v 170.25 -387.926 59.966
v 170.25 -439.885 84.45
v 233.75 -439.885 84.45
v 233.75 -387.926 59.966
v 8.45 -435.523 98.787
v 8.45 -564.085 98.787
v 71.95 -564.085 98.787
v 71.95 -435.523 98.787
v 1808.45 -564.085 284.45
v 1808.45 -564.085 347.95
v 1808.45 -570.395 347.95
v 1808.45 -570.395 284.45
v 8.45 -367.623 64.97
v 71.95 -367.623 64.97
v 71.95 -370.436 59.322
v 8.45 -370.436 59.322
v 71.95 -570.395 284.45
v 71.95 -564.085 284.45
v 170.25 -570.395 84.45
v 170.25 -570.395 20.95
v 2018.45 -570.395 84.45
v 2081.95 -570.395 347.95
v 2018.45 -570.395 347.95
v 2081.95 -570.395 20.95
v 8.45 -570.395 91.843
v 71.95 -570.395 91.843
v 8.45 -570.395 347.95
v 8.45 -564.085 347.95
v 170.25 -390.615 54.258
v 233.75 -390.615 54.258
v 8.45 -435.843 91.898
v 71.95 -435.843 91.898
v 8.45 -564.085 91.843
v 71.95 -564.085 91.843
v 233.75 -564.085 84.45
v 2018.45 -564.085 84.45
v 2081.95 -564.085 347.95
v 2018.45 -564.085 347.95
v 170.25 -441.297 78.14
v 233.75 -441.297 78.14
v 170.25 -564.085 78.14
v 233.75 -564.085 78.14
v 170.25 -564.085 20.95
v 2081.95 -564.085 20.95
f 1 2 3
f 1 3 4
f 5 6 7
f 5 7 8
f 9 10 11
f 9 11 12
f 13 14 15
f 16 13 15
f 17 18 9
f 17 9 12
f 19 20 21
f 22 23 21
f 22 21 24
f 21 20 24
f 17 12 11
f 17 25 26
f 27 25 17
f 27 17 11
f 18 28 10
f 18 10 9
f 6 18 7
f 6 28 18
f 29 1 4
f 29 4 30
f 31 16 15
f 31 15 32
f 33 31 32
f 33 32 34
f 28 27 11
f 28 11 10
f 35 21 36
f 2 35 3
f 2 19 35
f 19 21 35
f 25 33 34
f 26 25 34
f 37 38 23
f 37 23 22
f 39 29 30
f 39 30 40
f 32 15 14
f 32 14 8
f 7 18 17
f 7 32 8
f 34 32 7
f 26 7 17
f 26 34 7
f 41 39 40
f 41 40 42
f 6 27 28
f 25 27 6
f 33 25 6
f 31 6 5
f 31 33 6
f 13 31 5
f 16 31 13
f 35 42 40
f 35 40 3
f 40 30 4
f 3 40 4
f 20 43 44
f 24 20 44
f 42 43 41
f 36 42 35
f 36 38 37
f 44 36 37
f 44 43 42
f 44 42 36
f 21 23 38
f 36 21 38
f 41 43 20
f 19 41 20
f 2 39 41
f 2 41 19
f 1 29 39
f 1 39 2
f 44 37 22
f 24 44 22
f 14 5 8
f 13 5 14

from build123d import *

# Parameters (mm, degrees)
CROQUIS2_W              = 63.5
CROQUIS2_H              = 6.31
CROQUIS3_W              = 63.5
CROQUIS3_H              = 6.31
CROQUIS4_W              = 60
CROQUIS4_H              = 53.155
SALIENTE_EXTRUIR1_DEPTH = 6.31
CROQUIS5_W              = 60
CROQUIS5_H              = 6.31
CORTAR_EXTRUIR1_DEPTH   = 6.31
CORTAR_EXTRUIR2_DEPTH   = 502
CROQUIS8_W              = 63.5
CROQUIS8_H              = 564.085
CORTAR_EXTRUIR3_DEPTH   = 502
CROQUIS9_W              = 327
CROQUIS9_H              = 1084.052933
CORTAR_EXTRUIR4_DEPTH   = 502
CROQUIS10_W             = 63.5
CROQUIS10_H             = 6.31
CORTAR_EXTRUIR5_DEPTH   = 95
CORTAR_EXTRUIR6_DEPTH   = 95
CROQUIS13_W             = 120
CROQUIS13_H             = 256.105
CORTAR_EXTRUIR7_DEPTH   = 95
CROQUIS16_W             = 125
CROQUIS16_H             = 63.5
SALIENTE_EXTRUIR4_DEPTH = 6.31
CROQUIS17_W             = 63.5
CROQUIS17_H             = 6.31
SALIENTE_EXTRUIR5_DEPTH = 63.5
CROQUIS19_W             = 63.5
CROQUIS19_H             = 25.642933
CORTAR_EXTRUIR8_DEPTH   = 63.5
SALIENTE_EXTRUIR6_DEPTH = 63.5
CROQUIS21_W             = 10
CROQUIS21_H             = 63.5
CORTAR_EXTRUIR9_DEPTH   = 53


with BuildPart() as part:
    # Barrer1: sweep along a curve in space
    with BuildLine() as barrer1_path:
        Line((0, 0, 0), (0, -567.24, 0))
        Line((0, -567.24, 0), (0, -567.24, 316.2))
        Line((0, -567.24, 316.2), (1786.7, -567.24, 316.2))
        Line((1786.7, -567.24, 316.2), (1786.7, -567.24, 578))
        Line((1786.7, -567.24, 578), (1786.7, -435.47278313, 578))
        Line((1786.7, -435.47278313, 578), (1786.7, -435.47278313, 1432.002933))
    # Croquis2 → Barrer1 (sweep)
    with BuildSketch(Plane(origin=(0, 0, 0), x_dir=(1, 0, 0), z_dir=(0, 1, 0))):
        Rectangle(CROQUIS2_W, CROQUIS2_H)
        with Locations((263.5, 0)):
            Rectangle(CROQUIS2_W, CROQUIS2_H)
    sweep(path=barrer1_path.line, transition=Transition.RIGHT)

    # Barrer4: sweep along a curve in space
    with BuildLine() as barrer4_path:
        Line((-0.201028049, -3.155, -3.155), (-0.201028049, -3.155, -207.155))
        Line((-0.201028049, -3.155, -207.155), (-0.201028049, -53.155, -207.155))
    # Croquis3 → Barrer4 (sweep)
    with BuildSketch(Plane(origin=(0, 0, -3.155), x_dir=(-1, 0, 0), z_dir=(0, 0, -1))):
        with Locations((-263.5, -3.155)):
            Rectangle(CROQUIS3_W, CROQUIS3_H)
        with Locations((0, -3.155)):
            Rectangle(CROQUIS3_W, CROQUIS3_H)
    sweep(path=barrer4_path.line, transition=Transition.RIGHT)

    # Croquis4 → Saliente-Extruir1 (add)
    with BuildSketch(Plane(origin=(0, 0, -210.31), x_dir=(-1, 0, 0), z_dir=(0, 0, -1))):
        with Locations((-201.75, -26.5775)):
            Rectangle(CROQUIS4_W, CROQUIS4_H)
    extrude(amount=-SALIENTE_EXTRUIR1_DEPTH)

    # Croquis5 → Cortar-Extruir1 (cut)
    with BuildSketch(Plane.XY.offset(-204)):
        with Locations((201.75, -3.155)):
            Rectangle(CROQUIS5_W, CROQUIS5_H)
    extrude(amount=-CORTAR_EXTRUIR1_DEPTH, mode=Mode.SUBTRACT)

    # Croquis7 → Cortar-Extruir2 (cut)
    with BuildSketch(Plane.XY.offset(3.155)):
        Polygon((295.25, -564.085), (231.75, -564.085), (231.75, -68.875540851), (170.611072112, -68.875540851), (170.611072112, 0), (295.25, 0), align=None)
    extrude(amount=-CORTAR_EXTRUIR2_DEPTH, mode=Mode.SUBTRACT)

    # Croquis8 → Cortar-Extruir3 (cut)
    with BuildSketch(Plane.XY.offset(3.155)):
        with Locations((0, -282.0425)):
            Rectangle(CROQUIS8_W, CROQUIS8_H)
    extrude(amount=-CORTAR_EXTRUIR3_DEPTH, mode=Mode.SUBTRACT)

    # Croquis9 → Cortar-Extruir4 (cut)
    with BuildSketch(Plane(origin=(0, -432.31778313, 0), x_dir=(1, 0, 0), z_dir=(0, 1, 0))):
        with Locations((1918.45, -889.9764665)):
            Rectangle(CROQUIS9_W, CROQUIS9_H)
    extrude(amount=-CORTAR_EXTRUIR4_DEPTH, mode=Mode.SUBTRACT)

    # Croquis10 → Cortar-Extruir5 (cut)
    with BuildSketch(Plane(origin=(0, 0, -3.155), x_dir=(-1, 0, 0), z_dir=(0, 0, -1))):
        with Locations((0, -567.24)):
            Rectangle(CROQUIS10_W, CROQUIS10_H)
    extrude(amount=-CORTAR_EXTRUIR5_DEPTH, mode=Mode.SUBTRACT)

    # Croquis11 → Cortar-Extruir6 (cut)
    with BuildSketch(Plane(origin=(0, -564.085, 0), x_dir=(1, 0, 0), z_dir=(0, 1, 0))):
        Polygon((231.75, -84.45), (295.25, -84.45), (295.25, -20.95), align=None)
        Polygon((231.75, -84.45), (295.25, -20.95), (231.75, -20.95), align=None)
        Polygon((231.75, -20.95), (295.25, -20.95), (295.25, -3.155), (295.25, 3.155), (231.75, 3.155), (231.75, -3.155), align=None)
    extrude(amount=-CORTAR_EXTRUIR6_DEPTH, mode=Mode.SUBTRACT)

    # Croquis13 → Cortar-Extruir7 (cut)
    with BuildSketch(Plane(origin=(0, -564.085, 0), x_dir=(1, 0, 0), z_dir=(0, 1, 0))):
        with Locations((28.25, -219.8975)):
            Rectangle(CROQUIS13_W, CROQUIS13_H)
    extrude(amount=-CORTAR_EXTRUIR7_DEPTH, mode=Mode.SUBTRACT)

    # Croquis16 → Saliente-Extruir4 (add)
    with BuildSketch(Plane(origin=(0, -564.085, 0), x_dir=(1, 0, 0), z_dir=(0, 1, 0))):
        with Locations((232.75, -52.7)):
            Rectangle(CROQUIS16_W, CROQUIS16_H)
    extrude(amount=-SALIENTE_EXTRUIR4_DEPTH)

    # Barrer5: sweep along a curve in space
    with BuildLine() as barrer5_path:
        Line((88.25, -567.24, 316.2), (40.2, -567.24, 316.2))
        Line((40.2, -567.24, 316.2), (40.2, -567.24, 66.2))
    # Croquis17 → Barrer5 (sweep)
    with BuildSketch(Plane.ZY.offset(-88.25)):
        with Locations((316.2, -567.24)):
            Rectangle(CROQUIS17_W, CROQUIS17_H)
    sweep(path=barrer5_path.line, transition=Transition.RIGHT)

    # Croquis18 → Saliente-Extruir5 (add)
    with BuildSketch(Plane.ZY.offset(-8.45)):
        Polygon((98.787204793, -564.085), (98.787204793, -435.522965931), (64.969988324, -367.622744457), (59.321737777, -370.435814978), (91.897545374, -435.843461779), (91.842933, -564.085), align=None)
    extrude(amount=-SALIENTE_EXTRUIR5_DEPTH)

    # Croquis19 → Cortar-Extruir8 (cut)
    with BuildSketch(Plane(origin=(0, -564.085, 0), x_dir=(1, 0, 0), z_dir=(0, 1, 0))):
        with Locations((40.2, -79.0214665)):
            Rectangle(CROQUIS19_W, CROQUIS19_H)
    extrude(amount=-CORTAR_EXTRUIR8_DEPTH, mode=Mode.SUBTRACT)

    # Croquis20 → Saliente-Extruir6 (add)
    with BuildSketch(Plane.ZY.offset(-170.25)):
        Polygon((84.45, -564.085), (84.45, -439.884522326), (59.966060883, -387.925515276), (54.258037161, -390.615229981), (78.14, -441.296742852), (78.14, -564.085), align=None)
    extrude(amount=-SALIENTE_EXTRUIR6_DEPTH)

    # Croquis21 → Cortar-Extruir9 (cut)
    with BuildSketch(Plane(origin=(0, -564.085, 0), x_dir=(1, 0, 0), z_dir=(0, 1, 0))):
        with Locations((1813.45, -316.2)):
            Rectangle(CROQUIS21_W, CROQUIS21_H)
    extrude(amount=-CORTAR_EXTRUIR9_DEPTH, mode=Mode.SUBTRACT)


solid = part.part
